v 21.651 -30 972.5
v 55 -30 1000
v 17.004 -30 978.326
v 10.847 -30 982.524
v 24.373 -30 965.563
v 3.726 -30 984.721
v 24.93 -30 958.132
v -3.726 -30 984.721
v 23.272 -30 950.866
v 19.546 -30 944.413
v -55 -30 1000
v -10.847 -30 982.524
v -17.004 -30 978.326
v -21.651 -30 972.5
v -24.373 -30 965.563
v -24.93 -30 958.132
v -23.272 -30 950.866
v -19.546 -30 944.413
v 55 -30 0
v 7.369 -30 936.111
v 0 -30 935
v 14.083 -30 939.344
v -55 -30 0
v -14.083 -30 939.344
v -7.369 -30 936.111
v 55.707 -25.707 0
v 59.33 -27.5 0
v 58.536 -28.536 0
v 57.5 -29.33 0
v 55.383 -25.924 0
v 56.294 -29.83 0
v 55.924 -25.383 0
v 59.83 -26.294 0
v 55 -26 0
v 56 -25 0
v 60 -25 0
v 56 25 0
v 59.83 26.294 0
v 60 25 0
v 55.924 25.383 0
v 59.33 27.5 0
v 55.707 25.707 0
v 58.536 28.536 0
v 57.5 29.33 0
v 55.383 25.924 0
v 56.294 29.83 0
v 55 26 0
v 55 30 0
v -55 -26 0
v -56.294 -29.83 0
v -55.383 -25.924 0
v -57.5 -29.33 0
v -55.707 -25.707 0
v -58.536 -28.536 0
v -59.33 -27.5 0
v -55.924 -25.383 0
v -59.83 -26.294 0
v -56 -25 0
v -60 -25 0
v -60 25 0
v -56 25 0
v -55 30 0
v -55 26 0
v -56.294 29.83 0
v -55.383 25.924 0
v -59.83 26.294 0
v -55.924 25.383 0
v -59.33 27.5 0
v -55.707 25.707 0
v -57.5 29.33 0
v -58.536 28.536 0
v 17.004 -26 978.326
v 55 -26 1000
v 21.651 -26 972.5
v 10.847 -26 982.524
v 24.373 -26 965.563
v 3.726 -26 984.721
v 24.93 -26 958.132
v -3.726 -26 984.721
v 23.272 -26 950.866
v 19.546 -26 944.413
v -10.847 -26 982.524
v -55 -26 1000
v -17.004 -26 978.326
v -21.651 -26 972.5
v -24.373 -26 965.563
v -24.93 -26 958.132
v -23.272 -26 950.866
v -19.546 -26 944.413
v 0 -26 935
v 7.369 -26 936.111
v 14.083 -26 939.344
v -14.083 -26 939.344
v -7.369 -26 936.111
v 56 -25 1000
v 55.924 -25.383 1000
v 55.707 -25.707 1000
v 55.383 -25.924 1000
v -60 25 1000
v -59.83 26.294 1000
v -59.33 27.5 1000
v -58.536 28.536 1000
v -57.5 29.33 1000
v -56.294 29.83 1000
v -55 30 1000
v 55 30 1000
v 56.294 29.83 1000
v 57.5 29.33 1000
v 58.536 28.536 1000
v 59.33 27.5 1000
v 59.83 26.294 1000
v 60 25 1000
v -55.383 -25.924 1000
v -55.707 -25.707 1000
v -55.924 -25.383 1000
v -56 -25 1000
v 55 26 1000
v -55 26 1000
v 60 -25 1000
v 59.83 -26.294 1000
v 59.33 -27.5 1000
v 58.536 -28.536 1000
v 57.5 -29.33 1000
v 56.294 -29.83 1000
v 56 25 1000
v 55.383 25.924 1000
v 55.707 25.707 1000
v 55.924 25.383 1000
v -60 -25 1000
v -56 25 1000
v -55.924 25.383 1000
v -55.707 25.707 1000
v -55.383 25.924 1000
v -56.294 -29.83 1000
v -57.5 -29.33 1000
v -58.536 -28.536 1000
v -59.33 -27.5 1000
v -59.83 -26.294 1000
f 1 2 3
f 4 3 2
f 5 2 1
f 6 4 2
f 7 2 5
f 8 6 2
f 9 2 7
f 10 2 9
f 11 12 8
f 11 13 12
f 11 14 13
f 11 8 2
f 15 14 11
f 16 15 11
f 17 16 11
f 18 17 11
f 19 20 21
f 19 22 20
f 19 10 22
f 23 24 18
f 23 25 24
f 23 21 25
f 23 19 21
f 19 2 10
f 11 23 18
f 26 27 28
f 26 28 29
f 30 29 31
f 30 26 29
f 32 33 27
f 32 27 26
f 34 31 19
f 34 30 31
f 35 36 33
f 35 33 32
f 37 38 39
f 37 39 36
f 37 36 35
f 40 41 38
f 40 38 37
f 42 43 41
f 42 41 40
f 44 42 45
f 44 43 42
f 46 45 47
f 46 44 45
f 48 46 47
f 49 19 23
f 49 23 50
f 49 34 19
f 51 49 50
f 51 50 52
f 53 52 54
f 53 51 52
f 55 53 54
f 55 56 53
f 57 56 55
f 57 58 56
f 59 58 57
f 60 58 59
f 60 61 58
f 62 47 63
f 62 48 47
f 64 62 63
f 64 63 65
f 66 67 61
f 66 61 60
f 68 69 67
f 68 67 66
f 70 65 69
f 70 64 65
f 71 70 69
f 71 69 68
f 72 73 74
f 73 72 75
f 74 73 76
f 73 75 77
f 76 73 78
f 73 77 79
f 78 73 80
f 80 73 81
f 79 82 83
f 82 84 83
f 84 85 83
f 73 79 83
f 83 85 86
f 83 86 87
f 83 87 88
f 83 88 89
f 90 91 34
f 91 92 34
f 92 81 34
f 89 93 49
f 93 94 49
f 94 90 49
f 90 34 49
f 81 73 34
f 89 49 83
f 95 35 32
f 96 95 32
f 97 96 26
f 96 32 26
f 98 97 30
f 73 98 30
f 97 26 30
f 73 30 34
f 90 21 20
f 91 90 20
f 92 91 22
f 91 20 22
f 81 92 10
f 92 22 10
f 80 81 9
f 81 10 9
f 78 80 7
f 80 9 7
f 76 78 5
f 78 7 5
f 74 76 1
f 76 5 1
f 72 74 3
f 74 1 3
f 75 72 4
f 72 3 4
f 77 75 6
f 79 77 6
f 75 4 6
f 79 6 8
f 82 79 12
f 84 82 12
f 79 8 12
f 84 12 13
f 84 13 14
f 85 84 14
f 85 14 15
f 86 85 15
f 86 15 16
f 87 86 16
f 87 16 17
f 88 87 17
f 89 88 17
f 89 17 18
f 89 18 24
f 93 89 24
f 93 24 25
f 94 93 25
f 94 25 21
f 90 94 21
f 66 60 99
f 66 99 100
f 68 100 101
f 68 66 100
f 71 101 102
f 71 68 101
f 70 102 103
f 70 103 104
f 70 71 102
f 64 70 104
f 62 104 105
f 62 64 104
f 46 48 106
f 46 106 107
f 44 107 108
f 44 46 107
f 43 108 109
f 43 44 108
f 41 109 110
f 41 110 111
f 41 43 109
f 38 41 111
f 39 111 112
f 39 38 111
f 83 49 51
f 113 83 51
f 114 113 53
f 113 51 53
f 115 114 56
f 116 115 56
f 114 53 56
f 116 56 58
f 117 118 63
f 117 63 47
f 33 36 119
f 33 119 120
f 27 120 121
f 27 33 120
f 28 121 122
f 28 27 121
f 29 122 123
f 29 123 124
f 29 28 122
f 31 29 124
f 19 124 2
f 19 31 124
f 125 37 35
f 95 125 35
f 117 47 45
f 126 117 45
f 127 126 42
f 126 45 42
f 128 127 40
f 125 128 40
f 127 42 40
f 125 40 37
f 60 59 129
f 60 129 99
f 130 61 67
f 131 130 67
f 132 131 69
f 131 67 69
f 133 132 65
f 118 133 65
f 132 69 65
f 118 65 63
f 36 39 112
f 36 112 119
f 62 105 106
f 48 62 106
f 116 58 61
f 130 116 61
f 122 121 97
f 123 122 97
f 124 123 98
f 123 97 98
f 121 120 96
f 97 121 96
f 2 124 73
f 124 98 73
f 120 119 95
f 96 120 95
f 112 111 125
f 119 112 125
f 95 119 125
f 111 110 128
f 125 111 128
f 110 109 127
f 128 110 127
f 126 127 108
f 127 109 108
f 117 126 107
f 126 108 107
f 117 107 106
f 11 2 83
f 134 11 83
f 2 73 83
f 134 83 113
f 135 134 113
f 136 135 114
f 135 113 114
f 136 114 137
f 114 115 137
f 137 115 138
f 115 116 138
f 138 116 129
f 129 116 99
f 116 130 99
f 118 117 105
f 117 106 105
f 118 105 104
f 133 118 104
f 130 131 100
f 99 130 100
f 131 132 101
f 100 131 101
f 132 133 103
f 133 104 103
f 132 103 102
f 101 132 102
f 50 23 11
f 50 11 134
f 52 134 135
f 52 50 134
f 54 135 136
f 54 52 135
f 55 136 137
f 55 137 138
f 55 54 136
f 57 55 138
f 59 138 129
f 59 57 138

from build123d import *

# Parameters (mm, degrees)
EXTRUDE_1_DEPTH     = 1000
CUT_EXTRUDE_1_REACH = 1005.594
SKETCH_2_R          = 25


with BuildPart() as part:
    # 草图1 → 凸台-拉伸1 (new body)
    with BuildSketch(Plane.XY):
        with BuildLine():
            Line((-55, 30), (55, 30))
            ThreePointArc((55, 30), (58.535533906, 28.535533906), (60, 25))
            Line((60, 25), (60, -25))
            ThreePointArc((60, -25), (58.535533906, -28.535533906), (55, -30))
            Line((55, -30), (-55, -30))
            ThreePointArc((-55, -30), (-58.535533906, -28.535533906), (-60, -25))
            Line((-60, -25), (-60, 25))
            ThreePointArc((-60, 25), (-58.535533906, 28.535533906), (-55, 30))
        make_face()
        with BuildLine():
            Line((-55, 26), (55, 26))
            ThreePointArc((55, 26), (55.707106781, 25.707106781), (56, 25))
            Line((56, 25), (56, -25))
            ThreePointArc((56, -25), (55.707106781, -25.707106781), (55, -26))
            Line((55, -26), (-55, -26))
            ThreePointArc((-55, -26), (-55.707106781, -25.707106781), (-56, -25))
            Line((-56, -25), (-56, 25))
            ThreePointArc((-56, 25), (-55.707106781, 25.707106781), (-55, 26))
        make_face(mode=Mode.SUBTRACT)
    extrude(amount=EXTRUDE_1_DEPTH)

    # 草图2 → 切除-拉伸1 (cut, up to next)
    with BuildSketch(Plane.XZ.offset(30), mode=Mode.PRIVATE) as cut_extrude_1_sk1:
        with Locations(Location((0, 960, 0), (0, 0, 270))):
            Circle(SKETCH_2_R)
    cut_extrude_1_tool1 = extrude(cut_extrude_1_sk1.sketch, amount=-CUT_EXTRUDE_1_REACH, mode=Mode.PRIVATE) & part.part
    add(cut_extrude_1_tool1.solids().sort_by_distance((0, -30, 960))[0], mode=Mode.SUBTRACT)


solid = part.part
